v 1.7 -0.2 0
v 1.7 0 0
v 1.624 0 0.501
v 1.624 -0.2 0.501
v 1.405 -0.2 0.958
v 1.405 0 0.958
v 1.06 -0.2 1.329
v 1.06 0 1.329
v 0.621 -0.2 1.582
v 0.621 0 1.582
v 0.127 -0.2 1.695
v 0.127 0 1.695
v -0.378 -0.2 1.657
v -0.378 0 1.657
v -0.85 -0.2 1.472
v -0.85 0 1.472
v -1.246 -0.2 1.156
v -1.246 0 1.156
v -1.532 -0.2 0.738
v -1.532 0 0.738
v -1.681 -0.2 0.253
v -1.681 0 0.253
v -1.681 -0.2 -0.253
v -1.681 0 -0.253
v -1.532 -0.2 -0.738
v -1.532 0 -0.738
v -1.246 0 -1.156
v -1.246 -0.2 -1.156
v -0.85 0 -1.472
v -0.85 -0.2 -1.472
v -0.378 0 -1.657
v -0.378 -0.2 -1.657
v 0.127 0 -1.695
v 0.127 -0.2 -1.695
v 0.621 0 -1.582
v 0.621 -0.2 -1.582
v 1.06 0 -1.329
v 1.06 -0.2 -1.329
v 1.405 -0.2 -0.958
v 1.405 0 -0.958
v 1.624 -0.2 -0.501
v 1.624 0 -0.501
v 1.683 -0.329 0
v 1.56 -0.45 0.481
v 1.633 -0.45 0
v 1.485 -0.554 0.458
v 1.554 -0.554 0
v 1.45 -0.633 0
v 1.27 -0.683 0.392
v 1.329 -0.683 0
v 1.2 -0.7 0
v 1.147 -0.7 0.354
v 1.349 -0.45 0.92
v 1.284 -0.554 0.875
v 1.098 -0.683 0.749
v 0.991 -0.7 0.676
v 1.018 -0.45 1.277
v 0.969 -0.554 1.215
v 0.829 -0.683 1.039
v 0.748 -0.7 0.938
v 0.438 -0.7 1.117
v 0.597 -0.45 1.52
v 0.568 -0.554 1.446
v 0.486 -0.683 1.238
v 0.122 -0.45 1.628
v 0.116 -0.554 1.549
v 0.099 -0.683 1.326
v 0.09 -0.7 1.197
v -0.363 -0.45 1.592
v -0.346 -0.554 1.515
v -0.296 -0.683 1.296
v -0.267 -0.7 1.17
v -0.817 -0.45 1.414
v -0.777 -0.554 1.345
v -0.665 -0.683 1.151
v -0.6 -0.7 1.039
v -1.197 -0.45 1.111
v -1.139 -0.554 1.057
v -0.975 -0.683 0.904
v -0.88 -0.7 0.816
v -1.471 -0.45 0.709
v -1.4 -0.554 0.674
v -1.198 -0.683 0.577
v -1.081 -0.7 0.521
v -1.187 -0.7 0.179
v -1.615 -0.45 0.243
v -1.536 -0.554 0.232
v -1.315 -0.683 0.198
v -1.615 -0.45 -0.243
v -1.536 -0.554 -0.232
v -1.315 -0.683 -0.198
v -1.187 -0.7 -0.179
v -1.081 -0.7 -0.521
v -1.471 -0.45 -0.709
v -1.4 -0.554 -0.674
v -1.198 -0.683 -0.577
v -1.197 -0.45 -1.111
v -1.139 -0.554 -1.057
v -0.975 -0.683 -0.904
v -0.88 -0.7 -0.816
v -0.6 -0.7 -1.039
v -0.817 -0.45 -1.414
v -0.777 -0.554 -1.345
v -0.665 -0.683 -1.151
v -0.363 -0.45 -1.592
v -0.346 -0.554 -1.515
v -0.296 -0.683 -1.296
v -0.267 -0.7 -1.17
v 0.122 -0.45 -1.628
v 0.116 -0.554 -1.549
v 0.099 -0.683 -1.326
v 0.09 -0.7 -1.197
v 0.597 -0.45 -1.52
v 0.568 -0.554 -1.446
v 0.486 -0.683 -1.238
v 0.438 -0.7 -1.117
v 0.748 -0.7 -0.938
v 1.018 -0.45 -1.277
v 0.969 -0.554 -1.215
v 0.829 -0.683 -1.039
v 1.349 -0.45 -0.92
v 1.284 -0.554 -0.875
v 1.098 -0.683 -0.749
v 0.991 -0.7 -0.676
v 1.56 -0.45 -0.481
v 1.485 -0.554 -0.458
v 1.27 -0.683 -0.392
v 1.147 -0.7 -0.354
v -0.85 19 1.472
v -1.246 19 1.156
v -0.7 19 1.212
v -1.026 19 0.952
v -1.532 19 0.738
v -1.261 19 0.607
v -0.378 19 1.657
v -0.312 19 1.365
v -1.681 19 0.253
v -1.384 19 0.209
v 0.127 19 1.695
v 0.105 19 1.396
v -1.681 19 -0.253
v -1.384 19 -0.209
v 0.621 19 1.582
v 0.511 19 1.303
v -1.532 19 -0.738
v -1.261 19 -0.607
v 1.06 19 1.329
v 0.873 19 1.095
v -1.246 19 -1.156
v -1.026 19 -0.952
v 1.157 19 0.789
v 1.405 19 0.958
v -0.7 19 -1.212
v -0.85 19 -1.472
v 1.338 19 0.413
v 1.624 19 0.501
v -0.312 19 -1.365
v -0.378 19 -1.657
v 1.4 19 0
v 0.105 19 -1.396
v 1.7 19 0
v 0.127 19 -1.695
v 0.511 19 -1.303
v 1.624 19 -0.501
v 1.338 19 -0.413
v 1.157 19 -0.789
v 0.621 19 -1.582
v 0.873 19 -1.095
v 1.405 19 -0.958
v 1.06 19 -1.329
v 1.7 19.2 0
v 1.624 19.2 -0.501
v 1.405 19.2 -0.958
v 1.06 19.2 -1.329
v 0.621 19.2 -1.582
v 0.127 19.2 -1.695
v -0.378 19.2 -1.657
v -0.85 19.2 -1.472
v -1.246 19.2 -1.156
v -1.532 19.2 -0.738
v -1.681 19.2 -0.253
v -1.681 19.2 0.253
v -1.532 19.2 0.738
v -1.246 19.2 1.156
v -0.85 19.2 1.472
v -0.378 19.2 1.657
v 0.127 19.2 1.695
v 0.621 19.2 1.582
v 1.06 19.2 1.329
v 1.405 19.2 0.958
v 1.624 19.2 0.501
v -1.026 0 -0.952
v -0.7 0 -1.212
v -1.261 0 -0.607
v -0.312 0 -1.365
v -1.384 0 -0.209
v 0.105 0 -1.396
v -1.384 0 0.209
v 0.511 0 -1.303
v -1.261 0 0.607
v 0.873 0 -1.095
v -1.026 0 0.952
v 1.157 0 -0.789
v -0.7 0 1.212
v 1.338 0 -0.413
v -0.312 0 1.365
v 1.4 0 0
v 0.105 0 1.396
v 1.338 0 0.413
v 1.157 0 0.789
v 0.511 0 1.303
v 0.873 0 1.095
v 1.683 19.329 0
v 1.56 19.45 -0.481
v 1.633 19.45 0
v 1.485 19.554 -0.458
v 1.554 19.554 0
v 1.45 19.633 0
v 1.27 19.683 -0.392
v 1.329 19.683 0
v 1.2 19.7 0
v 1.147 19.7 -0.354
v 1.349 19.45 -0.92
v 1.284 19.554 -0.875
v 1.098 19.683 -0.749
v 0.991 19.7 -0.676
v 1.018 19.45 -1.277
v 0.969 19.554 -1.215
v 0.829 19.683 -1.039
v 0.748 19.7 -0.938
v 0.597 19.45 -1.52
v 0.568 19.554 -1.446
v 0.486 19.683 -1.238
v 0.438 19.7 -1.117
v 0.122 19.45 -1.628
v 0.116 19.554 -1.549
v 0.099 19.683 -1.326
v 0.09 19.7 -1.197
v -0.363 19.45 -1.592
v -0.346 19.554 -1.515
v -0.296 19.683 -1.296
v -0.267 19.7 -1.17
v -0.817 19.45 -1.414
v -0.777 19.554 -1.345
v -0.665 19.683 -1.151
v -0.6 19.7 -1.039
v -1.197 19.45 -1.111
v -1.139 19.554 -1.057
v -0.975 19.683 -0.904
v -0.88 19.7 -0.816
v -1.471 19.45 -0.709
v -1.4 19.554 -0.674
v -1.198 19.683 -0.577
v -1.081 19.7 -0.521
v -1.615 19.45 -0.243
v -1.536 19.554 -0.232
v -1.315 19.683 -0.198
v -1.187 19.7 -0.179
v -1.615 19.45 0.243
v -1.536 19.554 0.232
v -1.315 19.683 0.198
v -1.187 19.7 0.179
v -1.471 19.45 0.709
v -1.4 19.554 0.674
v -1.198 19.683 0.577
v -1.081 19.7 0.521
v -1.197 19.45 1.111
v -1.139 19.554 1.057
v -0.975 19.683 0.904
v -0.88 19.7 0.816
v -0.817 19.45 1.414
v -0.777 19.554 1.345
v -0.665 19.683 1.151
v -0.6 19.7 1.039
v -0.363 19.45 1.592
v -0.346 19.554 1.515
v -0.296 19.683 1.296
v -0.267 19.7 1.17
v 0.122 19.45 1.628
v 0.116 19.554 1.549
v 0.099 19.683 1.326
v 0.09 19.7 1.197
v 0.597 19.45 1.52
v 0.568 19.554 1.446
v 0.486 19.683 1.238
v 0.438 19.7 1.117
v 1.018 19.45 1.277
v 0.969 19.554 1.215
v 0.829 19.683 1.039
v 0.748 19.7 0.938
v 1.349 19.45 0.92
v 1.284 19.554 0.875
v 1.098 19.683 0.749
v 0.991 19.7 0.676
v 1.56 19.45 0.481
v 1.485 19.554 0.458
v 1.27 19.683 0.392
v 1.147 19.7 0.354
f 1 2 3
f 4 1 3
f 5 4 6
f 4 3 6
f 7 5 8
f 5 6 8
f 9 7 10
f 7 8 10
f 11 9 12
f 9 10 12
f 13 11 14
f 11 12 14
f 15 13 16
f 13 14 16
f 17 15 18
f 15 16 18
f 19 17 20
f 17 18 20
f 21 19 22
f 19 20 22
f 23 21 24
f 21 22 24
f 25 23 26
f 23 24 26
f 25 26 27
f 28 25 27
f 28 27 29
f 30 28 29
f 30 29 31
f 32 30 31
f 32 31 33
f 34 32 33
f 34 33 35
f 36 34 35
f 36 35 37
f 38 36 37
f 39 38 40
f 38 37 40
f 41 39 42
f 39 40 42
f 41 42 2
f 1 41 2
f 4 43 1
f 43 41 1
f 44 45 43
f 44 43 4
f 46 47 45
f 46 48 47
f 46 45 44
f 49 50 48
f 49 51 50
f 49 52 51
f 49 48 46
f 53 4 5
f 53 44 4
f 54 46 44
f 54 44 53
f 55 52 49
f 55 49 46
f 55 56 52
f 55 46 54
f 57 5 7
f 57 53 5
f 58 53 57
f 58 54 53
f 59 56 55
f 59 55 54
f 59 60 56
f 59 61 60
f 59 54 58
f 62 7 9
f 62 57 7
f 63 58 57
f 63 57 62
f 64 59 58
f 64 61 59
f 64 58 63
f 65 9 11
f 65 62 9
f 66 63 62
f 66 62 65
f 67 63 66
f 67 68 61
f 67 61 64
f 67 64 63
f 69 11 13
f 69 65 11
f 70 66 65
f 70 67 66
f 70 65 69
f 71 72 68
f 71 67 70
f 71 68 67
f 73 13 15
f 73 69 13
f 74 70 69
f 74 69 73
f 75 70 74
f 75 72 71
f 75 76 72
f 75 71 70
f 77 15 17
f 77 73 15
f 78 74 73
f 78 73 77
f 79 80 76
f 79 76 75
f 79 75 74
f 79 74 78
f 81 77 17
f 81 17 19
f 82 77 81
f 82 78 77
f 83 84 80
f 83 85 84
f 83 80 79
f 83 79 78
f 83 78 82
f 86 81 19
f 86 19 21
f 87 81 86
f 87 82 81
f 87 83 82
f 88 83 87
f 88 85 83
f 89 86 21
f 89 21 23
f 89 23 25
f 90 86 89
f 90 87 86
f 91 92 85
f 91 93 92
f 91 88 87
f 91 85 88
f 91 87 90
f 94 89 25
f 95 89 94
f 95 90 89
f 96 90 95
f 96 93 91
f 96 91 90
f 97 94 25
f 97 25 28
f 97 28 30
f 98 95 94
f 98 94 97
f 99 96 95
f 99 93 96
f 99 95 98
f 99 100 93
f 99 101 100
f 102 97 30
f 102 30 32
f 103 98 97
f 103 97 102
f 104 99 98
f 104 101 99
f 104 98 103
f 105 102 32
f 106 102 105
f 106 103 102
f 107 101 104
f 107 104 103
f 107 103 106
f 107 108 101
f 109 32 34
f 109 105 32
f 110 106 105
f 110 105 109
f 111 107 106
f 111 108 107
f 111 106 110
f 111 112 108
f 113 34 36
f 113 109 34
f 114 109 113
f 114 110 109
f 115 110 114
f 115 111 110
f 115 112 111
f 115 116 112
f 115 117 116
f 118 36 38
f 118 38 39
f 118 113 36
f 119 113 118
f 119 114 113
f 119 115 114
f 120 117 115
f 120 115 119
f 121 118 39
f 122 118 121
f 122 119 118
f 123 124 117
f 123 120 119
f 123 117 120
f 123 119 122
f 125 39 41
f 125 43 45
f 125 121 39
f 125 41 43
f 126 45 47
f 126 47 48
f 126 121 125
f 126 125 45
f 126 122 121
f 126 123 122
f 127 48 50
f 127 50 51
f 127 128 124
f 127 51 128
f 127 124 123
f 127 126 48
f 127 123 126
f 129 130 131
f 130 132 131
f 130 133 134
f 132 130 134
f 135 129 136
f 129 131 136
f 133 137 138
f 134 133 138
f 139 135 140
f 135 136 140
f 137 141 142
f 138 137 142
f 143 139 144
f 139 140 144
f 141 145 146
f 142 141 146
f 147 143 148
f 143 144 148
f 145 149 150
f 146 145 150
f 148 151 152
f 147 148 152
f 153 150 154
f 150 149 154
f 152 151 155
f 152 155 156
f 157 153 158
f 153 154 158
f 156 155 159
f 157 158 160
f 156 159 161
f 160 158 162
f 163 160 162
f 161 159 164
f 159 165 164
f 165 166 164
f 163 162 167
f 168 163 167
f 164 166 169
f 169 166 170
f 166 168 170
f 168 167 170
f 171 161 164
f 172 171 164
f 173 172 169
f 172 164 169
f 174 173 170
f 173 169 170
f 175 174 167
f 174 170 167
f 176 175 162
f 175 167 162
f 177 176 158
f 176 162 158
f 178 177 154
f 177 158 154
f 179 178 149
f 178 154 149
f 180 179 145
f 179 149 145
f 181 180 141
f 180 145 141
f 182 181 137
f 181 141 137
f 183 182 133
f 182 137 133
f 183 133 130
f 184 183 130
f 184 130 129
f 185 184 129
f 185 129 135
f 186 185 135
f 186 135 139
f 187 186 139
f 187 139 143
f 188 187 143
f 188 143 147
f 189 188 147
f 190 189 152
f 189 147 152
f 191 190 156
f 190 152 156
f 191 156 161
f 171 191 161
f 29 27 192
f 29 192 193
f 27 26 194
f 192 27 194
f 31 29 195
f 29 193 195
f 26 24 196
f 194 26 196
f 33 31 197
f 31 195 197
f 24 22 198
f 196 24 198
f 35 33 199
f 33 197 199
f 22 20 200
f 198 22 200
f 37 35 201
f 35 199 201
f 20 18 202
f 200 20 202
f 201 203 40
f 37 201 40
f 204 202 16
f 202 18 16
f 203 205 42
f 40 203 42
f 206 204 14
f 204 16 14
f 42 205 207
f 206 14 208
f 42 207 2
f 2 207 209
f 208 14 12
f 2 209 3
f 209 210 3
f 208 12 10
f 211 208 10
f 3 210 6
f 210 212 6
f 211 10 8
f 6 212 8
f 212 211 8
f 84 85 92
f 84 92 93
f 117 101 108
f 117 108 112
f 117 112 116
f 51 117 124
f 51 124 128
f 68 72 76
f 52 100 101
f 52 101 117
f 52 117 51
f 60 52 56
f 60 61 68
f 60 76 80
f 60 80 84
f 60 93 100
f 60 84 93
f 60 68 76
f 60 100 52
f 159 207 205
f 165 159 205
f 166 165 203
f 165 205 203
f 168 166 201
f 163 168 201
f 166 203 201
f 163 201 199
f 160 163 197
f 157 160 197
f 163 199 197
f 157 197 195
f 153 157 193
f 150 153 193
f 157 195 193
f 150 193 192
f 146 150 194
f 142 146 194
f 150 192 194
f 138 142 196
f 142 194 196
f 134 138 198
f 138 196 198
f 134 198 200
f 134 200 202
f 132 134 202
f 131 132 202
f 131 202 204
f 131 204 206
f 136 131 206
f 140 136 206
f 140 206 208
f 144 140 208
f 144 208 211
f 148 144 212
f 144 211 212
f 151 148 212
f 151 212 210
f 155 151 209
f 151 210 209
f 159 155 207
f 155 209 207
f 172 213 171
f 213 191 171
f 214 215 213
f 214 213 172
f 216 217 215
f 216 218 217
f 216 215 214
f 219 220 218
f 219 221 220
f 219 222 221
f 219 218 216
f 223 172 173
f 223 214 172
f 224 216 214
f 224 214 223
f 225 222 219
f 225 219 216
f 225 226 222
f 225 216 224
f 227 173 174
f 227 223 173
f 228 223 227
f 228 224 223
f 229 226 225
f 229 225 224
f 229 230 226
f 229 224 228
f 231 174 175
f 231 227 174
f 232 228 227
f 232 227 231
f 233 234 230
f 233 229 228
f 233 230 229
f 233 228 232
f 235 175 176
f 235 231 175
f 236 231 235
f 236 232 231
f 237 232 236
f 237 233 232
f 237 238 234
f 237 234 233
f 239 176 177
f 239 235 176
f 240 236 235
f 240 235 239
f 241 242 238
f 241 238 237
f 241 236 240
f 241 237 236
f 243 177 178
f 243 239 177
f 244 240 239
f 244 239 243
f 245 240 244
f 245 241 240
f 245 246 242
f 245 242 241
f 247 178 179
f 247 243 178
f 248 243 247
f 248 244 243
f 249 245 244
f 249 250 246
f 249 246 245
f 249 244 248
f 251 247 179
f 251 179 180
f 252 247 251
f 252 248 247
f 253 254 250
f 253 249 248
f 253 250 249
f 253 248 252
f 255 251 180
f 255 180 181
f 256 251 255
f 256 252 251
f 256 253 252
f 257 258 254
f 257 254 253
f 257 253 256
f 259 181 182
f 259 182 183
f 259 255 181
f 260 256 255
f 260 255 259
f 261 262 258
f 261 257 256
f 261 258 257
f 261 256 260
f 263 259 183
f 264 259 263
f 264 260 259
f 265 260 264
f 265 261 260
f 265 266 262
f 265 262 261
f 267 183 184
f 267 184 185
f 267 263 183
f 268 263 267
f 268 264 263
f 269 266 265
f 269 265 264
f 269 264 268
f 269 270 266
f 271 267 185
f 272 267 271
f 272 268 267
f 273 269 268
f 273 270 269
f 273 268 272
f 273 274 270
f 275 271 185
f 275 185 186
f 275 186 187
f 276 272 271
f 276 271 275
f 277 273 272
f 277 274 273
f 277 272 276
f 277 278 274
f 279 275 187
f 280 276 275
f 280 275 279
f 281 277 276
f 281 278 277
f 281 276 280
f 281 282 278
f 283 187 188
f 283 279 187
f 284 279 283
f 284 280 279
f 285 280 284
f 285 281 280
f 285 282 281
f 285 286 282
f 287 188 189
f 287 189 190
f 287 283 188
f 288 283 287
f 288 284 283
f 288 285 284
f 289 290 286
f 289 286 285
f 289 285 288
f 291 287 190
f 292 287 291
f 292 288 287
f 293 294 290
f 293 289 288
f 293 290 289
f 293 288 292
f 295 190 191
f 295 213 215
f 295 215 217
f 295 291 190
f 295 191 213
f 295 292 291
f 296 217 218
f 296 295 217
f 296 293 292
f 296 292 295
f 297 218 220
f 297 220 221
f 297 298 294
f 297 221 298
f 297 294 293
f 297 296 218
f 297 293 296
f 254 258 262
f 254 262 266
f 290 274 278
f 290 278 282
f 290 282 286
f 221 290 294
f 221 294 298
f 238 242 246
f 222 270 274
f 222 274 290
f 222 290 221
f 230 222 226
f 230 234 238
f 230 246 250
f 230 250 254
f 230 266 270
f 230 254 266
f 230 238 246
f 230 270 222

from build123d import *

# Parameters (mm, degrees)
SKETCH1_R           = 1.4
BOSS_EXTRUDE1_DEPTH = 19
SKETCH2_R           = 1.7
BOSS_EXTRUDE2_DEPTH = 0.7
FILLET1_R           = 0.5
SKETCH3_R           = 1.7
BOSS_EXTRUDE3_DEPTH = 0.7
FILLET2_R           = 0.5


with BuildPart() as part:
    # Sketch1 → Boss-Extrude1 (new body)
    with BuildSketch(Plane(origin=(0, 0, 0), x_dir=(1, 0, 0), z_dir=(0, 1, 0))):
        Circle(SKETCH1_R)
    extrude(amount=BOSS_EXTRUDE1_DEPTH)

    # Sketch2 → Boss-Extrude2 (add)
    with BuildSketch(Plane(origin=(0, 19, 0), x_dir=(1, 0, 0), z_dir=(0, 1, 0))):
        Circle(SKETCH2_R)
    extrude(amount=BOSS_EXTRUDE2_DEPTH)

    # Fillet1
    fillet1_edges = [part.edges().sort_by_distance(p)[0] for p in [
        (-1.7, 19.7, 0),
    ]]
    fillet(fillet1_edges, radius=FILLET1_R)

    # Sketch3 → Boss-Extrude3 (add)
    with BuildSketch(Plane.XZ):
        Circle(SKETCH3_R)
    extrude(amount=BOSS_EXTRUDE3_DEPTH)

    # Fillet2
    fillet2_edges = [part.edges().sort_by_distance(p)[0] for p in [
        (-1.7, -0.7, 0),
    ]]
    fillet(fillet2_edges, radius=FILLET2_R)


solid = part.part
